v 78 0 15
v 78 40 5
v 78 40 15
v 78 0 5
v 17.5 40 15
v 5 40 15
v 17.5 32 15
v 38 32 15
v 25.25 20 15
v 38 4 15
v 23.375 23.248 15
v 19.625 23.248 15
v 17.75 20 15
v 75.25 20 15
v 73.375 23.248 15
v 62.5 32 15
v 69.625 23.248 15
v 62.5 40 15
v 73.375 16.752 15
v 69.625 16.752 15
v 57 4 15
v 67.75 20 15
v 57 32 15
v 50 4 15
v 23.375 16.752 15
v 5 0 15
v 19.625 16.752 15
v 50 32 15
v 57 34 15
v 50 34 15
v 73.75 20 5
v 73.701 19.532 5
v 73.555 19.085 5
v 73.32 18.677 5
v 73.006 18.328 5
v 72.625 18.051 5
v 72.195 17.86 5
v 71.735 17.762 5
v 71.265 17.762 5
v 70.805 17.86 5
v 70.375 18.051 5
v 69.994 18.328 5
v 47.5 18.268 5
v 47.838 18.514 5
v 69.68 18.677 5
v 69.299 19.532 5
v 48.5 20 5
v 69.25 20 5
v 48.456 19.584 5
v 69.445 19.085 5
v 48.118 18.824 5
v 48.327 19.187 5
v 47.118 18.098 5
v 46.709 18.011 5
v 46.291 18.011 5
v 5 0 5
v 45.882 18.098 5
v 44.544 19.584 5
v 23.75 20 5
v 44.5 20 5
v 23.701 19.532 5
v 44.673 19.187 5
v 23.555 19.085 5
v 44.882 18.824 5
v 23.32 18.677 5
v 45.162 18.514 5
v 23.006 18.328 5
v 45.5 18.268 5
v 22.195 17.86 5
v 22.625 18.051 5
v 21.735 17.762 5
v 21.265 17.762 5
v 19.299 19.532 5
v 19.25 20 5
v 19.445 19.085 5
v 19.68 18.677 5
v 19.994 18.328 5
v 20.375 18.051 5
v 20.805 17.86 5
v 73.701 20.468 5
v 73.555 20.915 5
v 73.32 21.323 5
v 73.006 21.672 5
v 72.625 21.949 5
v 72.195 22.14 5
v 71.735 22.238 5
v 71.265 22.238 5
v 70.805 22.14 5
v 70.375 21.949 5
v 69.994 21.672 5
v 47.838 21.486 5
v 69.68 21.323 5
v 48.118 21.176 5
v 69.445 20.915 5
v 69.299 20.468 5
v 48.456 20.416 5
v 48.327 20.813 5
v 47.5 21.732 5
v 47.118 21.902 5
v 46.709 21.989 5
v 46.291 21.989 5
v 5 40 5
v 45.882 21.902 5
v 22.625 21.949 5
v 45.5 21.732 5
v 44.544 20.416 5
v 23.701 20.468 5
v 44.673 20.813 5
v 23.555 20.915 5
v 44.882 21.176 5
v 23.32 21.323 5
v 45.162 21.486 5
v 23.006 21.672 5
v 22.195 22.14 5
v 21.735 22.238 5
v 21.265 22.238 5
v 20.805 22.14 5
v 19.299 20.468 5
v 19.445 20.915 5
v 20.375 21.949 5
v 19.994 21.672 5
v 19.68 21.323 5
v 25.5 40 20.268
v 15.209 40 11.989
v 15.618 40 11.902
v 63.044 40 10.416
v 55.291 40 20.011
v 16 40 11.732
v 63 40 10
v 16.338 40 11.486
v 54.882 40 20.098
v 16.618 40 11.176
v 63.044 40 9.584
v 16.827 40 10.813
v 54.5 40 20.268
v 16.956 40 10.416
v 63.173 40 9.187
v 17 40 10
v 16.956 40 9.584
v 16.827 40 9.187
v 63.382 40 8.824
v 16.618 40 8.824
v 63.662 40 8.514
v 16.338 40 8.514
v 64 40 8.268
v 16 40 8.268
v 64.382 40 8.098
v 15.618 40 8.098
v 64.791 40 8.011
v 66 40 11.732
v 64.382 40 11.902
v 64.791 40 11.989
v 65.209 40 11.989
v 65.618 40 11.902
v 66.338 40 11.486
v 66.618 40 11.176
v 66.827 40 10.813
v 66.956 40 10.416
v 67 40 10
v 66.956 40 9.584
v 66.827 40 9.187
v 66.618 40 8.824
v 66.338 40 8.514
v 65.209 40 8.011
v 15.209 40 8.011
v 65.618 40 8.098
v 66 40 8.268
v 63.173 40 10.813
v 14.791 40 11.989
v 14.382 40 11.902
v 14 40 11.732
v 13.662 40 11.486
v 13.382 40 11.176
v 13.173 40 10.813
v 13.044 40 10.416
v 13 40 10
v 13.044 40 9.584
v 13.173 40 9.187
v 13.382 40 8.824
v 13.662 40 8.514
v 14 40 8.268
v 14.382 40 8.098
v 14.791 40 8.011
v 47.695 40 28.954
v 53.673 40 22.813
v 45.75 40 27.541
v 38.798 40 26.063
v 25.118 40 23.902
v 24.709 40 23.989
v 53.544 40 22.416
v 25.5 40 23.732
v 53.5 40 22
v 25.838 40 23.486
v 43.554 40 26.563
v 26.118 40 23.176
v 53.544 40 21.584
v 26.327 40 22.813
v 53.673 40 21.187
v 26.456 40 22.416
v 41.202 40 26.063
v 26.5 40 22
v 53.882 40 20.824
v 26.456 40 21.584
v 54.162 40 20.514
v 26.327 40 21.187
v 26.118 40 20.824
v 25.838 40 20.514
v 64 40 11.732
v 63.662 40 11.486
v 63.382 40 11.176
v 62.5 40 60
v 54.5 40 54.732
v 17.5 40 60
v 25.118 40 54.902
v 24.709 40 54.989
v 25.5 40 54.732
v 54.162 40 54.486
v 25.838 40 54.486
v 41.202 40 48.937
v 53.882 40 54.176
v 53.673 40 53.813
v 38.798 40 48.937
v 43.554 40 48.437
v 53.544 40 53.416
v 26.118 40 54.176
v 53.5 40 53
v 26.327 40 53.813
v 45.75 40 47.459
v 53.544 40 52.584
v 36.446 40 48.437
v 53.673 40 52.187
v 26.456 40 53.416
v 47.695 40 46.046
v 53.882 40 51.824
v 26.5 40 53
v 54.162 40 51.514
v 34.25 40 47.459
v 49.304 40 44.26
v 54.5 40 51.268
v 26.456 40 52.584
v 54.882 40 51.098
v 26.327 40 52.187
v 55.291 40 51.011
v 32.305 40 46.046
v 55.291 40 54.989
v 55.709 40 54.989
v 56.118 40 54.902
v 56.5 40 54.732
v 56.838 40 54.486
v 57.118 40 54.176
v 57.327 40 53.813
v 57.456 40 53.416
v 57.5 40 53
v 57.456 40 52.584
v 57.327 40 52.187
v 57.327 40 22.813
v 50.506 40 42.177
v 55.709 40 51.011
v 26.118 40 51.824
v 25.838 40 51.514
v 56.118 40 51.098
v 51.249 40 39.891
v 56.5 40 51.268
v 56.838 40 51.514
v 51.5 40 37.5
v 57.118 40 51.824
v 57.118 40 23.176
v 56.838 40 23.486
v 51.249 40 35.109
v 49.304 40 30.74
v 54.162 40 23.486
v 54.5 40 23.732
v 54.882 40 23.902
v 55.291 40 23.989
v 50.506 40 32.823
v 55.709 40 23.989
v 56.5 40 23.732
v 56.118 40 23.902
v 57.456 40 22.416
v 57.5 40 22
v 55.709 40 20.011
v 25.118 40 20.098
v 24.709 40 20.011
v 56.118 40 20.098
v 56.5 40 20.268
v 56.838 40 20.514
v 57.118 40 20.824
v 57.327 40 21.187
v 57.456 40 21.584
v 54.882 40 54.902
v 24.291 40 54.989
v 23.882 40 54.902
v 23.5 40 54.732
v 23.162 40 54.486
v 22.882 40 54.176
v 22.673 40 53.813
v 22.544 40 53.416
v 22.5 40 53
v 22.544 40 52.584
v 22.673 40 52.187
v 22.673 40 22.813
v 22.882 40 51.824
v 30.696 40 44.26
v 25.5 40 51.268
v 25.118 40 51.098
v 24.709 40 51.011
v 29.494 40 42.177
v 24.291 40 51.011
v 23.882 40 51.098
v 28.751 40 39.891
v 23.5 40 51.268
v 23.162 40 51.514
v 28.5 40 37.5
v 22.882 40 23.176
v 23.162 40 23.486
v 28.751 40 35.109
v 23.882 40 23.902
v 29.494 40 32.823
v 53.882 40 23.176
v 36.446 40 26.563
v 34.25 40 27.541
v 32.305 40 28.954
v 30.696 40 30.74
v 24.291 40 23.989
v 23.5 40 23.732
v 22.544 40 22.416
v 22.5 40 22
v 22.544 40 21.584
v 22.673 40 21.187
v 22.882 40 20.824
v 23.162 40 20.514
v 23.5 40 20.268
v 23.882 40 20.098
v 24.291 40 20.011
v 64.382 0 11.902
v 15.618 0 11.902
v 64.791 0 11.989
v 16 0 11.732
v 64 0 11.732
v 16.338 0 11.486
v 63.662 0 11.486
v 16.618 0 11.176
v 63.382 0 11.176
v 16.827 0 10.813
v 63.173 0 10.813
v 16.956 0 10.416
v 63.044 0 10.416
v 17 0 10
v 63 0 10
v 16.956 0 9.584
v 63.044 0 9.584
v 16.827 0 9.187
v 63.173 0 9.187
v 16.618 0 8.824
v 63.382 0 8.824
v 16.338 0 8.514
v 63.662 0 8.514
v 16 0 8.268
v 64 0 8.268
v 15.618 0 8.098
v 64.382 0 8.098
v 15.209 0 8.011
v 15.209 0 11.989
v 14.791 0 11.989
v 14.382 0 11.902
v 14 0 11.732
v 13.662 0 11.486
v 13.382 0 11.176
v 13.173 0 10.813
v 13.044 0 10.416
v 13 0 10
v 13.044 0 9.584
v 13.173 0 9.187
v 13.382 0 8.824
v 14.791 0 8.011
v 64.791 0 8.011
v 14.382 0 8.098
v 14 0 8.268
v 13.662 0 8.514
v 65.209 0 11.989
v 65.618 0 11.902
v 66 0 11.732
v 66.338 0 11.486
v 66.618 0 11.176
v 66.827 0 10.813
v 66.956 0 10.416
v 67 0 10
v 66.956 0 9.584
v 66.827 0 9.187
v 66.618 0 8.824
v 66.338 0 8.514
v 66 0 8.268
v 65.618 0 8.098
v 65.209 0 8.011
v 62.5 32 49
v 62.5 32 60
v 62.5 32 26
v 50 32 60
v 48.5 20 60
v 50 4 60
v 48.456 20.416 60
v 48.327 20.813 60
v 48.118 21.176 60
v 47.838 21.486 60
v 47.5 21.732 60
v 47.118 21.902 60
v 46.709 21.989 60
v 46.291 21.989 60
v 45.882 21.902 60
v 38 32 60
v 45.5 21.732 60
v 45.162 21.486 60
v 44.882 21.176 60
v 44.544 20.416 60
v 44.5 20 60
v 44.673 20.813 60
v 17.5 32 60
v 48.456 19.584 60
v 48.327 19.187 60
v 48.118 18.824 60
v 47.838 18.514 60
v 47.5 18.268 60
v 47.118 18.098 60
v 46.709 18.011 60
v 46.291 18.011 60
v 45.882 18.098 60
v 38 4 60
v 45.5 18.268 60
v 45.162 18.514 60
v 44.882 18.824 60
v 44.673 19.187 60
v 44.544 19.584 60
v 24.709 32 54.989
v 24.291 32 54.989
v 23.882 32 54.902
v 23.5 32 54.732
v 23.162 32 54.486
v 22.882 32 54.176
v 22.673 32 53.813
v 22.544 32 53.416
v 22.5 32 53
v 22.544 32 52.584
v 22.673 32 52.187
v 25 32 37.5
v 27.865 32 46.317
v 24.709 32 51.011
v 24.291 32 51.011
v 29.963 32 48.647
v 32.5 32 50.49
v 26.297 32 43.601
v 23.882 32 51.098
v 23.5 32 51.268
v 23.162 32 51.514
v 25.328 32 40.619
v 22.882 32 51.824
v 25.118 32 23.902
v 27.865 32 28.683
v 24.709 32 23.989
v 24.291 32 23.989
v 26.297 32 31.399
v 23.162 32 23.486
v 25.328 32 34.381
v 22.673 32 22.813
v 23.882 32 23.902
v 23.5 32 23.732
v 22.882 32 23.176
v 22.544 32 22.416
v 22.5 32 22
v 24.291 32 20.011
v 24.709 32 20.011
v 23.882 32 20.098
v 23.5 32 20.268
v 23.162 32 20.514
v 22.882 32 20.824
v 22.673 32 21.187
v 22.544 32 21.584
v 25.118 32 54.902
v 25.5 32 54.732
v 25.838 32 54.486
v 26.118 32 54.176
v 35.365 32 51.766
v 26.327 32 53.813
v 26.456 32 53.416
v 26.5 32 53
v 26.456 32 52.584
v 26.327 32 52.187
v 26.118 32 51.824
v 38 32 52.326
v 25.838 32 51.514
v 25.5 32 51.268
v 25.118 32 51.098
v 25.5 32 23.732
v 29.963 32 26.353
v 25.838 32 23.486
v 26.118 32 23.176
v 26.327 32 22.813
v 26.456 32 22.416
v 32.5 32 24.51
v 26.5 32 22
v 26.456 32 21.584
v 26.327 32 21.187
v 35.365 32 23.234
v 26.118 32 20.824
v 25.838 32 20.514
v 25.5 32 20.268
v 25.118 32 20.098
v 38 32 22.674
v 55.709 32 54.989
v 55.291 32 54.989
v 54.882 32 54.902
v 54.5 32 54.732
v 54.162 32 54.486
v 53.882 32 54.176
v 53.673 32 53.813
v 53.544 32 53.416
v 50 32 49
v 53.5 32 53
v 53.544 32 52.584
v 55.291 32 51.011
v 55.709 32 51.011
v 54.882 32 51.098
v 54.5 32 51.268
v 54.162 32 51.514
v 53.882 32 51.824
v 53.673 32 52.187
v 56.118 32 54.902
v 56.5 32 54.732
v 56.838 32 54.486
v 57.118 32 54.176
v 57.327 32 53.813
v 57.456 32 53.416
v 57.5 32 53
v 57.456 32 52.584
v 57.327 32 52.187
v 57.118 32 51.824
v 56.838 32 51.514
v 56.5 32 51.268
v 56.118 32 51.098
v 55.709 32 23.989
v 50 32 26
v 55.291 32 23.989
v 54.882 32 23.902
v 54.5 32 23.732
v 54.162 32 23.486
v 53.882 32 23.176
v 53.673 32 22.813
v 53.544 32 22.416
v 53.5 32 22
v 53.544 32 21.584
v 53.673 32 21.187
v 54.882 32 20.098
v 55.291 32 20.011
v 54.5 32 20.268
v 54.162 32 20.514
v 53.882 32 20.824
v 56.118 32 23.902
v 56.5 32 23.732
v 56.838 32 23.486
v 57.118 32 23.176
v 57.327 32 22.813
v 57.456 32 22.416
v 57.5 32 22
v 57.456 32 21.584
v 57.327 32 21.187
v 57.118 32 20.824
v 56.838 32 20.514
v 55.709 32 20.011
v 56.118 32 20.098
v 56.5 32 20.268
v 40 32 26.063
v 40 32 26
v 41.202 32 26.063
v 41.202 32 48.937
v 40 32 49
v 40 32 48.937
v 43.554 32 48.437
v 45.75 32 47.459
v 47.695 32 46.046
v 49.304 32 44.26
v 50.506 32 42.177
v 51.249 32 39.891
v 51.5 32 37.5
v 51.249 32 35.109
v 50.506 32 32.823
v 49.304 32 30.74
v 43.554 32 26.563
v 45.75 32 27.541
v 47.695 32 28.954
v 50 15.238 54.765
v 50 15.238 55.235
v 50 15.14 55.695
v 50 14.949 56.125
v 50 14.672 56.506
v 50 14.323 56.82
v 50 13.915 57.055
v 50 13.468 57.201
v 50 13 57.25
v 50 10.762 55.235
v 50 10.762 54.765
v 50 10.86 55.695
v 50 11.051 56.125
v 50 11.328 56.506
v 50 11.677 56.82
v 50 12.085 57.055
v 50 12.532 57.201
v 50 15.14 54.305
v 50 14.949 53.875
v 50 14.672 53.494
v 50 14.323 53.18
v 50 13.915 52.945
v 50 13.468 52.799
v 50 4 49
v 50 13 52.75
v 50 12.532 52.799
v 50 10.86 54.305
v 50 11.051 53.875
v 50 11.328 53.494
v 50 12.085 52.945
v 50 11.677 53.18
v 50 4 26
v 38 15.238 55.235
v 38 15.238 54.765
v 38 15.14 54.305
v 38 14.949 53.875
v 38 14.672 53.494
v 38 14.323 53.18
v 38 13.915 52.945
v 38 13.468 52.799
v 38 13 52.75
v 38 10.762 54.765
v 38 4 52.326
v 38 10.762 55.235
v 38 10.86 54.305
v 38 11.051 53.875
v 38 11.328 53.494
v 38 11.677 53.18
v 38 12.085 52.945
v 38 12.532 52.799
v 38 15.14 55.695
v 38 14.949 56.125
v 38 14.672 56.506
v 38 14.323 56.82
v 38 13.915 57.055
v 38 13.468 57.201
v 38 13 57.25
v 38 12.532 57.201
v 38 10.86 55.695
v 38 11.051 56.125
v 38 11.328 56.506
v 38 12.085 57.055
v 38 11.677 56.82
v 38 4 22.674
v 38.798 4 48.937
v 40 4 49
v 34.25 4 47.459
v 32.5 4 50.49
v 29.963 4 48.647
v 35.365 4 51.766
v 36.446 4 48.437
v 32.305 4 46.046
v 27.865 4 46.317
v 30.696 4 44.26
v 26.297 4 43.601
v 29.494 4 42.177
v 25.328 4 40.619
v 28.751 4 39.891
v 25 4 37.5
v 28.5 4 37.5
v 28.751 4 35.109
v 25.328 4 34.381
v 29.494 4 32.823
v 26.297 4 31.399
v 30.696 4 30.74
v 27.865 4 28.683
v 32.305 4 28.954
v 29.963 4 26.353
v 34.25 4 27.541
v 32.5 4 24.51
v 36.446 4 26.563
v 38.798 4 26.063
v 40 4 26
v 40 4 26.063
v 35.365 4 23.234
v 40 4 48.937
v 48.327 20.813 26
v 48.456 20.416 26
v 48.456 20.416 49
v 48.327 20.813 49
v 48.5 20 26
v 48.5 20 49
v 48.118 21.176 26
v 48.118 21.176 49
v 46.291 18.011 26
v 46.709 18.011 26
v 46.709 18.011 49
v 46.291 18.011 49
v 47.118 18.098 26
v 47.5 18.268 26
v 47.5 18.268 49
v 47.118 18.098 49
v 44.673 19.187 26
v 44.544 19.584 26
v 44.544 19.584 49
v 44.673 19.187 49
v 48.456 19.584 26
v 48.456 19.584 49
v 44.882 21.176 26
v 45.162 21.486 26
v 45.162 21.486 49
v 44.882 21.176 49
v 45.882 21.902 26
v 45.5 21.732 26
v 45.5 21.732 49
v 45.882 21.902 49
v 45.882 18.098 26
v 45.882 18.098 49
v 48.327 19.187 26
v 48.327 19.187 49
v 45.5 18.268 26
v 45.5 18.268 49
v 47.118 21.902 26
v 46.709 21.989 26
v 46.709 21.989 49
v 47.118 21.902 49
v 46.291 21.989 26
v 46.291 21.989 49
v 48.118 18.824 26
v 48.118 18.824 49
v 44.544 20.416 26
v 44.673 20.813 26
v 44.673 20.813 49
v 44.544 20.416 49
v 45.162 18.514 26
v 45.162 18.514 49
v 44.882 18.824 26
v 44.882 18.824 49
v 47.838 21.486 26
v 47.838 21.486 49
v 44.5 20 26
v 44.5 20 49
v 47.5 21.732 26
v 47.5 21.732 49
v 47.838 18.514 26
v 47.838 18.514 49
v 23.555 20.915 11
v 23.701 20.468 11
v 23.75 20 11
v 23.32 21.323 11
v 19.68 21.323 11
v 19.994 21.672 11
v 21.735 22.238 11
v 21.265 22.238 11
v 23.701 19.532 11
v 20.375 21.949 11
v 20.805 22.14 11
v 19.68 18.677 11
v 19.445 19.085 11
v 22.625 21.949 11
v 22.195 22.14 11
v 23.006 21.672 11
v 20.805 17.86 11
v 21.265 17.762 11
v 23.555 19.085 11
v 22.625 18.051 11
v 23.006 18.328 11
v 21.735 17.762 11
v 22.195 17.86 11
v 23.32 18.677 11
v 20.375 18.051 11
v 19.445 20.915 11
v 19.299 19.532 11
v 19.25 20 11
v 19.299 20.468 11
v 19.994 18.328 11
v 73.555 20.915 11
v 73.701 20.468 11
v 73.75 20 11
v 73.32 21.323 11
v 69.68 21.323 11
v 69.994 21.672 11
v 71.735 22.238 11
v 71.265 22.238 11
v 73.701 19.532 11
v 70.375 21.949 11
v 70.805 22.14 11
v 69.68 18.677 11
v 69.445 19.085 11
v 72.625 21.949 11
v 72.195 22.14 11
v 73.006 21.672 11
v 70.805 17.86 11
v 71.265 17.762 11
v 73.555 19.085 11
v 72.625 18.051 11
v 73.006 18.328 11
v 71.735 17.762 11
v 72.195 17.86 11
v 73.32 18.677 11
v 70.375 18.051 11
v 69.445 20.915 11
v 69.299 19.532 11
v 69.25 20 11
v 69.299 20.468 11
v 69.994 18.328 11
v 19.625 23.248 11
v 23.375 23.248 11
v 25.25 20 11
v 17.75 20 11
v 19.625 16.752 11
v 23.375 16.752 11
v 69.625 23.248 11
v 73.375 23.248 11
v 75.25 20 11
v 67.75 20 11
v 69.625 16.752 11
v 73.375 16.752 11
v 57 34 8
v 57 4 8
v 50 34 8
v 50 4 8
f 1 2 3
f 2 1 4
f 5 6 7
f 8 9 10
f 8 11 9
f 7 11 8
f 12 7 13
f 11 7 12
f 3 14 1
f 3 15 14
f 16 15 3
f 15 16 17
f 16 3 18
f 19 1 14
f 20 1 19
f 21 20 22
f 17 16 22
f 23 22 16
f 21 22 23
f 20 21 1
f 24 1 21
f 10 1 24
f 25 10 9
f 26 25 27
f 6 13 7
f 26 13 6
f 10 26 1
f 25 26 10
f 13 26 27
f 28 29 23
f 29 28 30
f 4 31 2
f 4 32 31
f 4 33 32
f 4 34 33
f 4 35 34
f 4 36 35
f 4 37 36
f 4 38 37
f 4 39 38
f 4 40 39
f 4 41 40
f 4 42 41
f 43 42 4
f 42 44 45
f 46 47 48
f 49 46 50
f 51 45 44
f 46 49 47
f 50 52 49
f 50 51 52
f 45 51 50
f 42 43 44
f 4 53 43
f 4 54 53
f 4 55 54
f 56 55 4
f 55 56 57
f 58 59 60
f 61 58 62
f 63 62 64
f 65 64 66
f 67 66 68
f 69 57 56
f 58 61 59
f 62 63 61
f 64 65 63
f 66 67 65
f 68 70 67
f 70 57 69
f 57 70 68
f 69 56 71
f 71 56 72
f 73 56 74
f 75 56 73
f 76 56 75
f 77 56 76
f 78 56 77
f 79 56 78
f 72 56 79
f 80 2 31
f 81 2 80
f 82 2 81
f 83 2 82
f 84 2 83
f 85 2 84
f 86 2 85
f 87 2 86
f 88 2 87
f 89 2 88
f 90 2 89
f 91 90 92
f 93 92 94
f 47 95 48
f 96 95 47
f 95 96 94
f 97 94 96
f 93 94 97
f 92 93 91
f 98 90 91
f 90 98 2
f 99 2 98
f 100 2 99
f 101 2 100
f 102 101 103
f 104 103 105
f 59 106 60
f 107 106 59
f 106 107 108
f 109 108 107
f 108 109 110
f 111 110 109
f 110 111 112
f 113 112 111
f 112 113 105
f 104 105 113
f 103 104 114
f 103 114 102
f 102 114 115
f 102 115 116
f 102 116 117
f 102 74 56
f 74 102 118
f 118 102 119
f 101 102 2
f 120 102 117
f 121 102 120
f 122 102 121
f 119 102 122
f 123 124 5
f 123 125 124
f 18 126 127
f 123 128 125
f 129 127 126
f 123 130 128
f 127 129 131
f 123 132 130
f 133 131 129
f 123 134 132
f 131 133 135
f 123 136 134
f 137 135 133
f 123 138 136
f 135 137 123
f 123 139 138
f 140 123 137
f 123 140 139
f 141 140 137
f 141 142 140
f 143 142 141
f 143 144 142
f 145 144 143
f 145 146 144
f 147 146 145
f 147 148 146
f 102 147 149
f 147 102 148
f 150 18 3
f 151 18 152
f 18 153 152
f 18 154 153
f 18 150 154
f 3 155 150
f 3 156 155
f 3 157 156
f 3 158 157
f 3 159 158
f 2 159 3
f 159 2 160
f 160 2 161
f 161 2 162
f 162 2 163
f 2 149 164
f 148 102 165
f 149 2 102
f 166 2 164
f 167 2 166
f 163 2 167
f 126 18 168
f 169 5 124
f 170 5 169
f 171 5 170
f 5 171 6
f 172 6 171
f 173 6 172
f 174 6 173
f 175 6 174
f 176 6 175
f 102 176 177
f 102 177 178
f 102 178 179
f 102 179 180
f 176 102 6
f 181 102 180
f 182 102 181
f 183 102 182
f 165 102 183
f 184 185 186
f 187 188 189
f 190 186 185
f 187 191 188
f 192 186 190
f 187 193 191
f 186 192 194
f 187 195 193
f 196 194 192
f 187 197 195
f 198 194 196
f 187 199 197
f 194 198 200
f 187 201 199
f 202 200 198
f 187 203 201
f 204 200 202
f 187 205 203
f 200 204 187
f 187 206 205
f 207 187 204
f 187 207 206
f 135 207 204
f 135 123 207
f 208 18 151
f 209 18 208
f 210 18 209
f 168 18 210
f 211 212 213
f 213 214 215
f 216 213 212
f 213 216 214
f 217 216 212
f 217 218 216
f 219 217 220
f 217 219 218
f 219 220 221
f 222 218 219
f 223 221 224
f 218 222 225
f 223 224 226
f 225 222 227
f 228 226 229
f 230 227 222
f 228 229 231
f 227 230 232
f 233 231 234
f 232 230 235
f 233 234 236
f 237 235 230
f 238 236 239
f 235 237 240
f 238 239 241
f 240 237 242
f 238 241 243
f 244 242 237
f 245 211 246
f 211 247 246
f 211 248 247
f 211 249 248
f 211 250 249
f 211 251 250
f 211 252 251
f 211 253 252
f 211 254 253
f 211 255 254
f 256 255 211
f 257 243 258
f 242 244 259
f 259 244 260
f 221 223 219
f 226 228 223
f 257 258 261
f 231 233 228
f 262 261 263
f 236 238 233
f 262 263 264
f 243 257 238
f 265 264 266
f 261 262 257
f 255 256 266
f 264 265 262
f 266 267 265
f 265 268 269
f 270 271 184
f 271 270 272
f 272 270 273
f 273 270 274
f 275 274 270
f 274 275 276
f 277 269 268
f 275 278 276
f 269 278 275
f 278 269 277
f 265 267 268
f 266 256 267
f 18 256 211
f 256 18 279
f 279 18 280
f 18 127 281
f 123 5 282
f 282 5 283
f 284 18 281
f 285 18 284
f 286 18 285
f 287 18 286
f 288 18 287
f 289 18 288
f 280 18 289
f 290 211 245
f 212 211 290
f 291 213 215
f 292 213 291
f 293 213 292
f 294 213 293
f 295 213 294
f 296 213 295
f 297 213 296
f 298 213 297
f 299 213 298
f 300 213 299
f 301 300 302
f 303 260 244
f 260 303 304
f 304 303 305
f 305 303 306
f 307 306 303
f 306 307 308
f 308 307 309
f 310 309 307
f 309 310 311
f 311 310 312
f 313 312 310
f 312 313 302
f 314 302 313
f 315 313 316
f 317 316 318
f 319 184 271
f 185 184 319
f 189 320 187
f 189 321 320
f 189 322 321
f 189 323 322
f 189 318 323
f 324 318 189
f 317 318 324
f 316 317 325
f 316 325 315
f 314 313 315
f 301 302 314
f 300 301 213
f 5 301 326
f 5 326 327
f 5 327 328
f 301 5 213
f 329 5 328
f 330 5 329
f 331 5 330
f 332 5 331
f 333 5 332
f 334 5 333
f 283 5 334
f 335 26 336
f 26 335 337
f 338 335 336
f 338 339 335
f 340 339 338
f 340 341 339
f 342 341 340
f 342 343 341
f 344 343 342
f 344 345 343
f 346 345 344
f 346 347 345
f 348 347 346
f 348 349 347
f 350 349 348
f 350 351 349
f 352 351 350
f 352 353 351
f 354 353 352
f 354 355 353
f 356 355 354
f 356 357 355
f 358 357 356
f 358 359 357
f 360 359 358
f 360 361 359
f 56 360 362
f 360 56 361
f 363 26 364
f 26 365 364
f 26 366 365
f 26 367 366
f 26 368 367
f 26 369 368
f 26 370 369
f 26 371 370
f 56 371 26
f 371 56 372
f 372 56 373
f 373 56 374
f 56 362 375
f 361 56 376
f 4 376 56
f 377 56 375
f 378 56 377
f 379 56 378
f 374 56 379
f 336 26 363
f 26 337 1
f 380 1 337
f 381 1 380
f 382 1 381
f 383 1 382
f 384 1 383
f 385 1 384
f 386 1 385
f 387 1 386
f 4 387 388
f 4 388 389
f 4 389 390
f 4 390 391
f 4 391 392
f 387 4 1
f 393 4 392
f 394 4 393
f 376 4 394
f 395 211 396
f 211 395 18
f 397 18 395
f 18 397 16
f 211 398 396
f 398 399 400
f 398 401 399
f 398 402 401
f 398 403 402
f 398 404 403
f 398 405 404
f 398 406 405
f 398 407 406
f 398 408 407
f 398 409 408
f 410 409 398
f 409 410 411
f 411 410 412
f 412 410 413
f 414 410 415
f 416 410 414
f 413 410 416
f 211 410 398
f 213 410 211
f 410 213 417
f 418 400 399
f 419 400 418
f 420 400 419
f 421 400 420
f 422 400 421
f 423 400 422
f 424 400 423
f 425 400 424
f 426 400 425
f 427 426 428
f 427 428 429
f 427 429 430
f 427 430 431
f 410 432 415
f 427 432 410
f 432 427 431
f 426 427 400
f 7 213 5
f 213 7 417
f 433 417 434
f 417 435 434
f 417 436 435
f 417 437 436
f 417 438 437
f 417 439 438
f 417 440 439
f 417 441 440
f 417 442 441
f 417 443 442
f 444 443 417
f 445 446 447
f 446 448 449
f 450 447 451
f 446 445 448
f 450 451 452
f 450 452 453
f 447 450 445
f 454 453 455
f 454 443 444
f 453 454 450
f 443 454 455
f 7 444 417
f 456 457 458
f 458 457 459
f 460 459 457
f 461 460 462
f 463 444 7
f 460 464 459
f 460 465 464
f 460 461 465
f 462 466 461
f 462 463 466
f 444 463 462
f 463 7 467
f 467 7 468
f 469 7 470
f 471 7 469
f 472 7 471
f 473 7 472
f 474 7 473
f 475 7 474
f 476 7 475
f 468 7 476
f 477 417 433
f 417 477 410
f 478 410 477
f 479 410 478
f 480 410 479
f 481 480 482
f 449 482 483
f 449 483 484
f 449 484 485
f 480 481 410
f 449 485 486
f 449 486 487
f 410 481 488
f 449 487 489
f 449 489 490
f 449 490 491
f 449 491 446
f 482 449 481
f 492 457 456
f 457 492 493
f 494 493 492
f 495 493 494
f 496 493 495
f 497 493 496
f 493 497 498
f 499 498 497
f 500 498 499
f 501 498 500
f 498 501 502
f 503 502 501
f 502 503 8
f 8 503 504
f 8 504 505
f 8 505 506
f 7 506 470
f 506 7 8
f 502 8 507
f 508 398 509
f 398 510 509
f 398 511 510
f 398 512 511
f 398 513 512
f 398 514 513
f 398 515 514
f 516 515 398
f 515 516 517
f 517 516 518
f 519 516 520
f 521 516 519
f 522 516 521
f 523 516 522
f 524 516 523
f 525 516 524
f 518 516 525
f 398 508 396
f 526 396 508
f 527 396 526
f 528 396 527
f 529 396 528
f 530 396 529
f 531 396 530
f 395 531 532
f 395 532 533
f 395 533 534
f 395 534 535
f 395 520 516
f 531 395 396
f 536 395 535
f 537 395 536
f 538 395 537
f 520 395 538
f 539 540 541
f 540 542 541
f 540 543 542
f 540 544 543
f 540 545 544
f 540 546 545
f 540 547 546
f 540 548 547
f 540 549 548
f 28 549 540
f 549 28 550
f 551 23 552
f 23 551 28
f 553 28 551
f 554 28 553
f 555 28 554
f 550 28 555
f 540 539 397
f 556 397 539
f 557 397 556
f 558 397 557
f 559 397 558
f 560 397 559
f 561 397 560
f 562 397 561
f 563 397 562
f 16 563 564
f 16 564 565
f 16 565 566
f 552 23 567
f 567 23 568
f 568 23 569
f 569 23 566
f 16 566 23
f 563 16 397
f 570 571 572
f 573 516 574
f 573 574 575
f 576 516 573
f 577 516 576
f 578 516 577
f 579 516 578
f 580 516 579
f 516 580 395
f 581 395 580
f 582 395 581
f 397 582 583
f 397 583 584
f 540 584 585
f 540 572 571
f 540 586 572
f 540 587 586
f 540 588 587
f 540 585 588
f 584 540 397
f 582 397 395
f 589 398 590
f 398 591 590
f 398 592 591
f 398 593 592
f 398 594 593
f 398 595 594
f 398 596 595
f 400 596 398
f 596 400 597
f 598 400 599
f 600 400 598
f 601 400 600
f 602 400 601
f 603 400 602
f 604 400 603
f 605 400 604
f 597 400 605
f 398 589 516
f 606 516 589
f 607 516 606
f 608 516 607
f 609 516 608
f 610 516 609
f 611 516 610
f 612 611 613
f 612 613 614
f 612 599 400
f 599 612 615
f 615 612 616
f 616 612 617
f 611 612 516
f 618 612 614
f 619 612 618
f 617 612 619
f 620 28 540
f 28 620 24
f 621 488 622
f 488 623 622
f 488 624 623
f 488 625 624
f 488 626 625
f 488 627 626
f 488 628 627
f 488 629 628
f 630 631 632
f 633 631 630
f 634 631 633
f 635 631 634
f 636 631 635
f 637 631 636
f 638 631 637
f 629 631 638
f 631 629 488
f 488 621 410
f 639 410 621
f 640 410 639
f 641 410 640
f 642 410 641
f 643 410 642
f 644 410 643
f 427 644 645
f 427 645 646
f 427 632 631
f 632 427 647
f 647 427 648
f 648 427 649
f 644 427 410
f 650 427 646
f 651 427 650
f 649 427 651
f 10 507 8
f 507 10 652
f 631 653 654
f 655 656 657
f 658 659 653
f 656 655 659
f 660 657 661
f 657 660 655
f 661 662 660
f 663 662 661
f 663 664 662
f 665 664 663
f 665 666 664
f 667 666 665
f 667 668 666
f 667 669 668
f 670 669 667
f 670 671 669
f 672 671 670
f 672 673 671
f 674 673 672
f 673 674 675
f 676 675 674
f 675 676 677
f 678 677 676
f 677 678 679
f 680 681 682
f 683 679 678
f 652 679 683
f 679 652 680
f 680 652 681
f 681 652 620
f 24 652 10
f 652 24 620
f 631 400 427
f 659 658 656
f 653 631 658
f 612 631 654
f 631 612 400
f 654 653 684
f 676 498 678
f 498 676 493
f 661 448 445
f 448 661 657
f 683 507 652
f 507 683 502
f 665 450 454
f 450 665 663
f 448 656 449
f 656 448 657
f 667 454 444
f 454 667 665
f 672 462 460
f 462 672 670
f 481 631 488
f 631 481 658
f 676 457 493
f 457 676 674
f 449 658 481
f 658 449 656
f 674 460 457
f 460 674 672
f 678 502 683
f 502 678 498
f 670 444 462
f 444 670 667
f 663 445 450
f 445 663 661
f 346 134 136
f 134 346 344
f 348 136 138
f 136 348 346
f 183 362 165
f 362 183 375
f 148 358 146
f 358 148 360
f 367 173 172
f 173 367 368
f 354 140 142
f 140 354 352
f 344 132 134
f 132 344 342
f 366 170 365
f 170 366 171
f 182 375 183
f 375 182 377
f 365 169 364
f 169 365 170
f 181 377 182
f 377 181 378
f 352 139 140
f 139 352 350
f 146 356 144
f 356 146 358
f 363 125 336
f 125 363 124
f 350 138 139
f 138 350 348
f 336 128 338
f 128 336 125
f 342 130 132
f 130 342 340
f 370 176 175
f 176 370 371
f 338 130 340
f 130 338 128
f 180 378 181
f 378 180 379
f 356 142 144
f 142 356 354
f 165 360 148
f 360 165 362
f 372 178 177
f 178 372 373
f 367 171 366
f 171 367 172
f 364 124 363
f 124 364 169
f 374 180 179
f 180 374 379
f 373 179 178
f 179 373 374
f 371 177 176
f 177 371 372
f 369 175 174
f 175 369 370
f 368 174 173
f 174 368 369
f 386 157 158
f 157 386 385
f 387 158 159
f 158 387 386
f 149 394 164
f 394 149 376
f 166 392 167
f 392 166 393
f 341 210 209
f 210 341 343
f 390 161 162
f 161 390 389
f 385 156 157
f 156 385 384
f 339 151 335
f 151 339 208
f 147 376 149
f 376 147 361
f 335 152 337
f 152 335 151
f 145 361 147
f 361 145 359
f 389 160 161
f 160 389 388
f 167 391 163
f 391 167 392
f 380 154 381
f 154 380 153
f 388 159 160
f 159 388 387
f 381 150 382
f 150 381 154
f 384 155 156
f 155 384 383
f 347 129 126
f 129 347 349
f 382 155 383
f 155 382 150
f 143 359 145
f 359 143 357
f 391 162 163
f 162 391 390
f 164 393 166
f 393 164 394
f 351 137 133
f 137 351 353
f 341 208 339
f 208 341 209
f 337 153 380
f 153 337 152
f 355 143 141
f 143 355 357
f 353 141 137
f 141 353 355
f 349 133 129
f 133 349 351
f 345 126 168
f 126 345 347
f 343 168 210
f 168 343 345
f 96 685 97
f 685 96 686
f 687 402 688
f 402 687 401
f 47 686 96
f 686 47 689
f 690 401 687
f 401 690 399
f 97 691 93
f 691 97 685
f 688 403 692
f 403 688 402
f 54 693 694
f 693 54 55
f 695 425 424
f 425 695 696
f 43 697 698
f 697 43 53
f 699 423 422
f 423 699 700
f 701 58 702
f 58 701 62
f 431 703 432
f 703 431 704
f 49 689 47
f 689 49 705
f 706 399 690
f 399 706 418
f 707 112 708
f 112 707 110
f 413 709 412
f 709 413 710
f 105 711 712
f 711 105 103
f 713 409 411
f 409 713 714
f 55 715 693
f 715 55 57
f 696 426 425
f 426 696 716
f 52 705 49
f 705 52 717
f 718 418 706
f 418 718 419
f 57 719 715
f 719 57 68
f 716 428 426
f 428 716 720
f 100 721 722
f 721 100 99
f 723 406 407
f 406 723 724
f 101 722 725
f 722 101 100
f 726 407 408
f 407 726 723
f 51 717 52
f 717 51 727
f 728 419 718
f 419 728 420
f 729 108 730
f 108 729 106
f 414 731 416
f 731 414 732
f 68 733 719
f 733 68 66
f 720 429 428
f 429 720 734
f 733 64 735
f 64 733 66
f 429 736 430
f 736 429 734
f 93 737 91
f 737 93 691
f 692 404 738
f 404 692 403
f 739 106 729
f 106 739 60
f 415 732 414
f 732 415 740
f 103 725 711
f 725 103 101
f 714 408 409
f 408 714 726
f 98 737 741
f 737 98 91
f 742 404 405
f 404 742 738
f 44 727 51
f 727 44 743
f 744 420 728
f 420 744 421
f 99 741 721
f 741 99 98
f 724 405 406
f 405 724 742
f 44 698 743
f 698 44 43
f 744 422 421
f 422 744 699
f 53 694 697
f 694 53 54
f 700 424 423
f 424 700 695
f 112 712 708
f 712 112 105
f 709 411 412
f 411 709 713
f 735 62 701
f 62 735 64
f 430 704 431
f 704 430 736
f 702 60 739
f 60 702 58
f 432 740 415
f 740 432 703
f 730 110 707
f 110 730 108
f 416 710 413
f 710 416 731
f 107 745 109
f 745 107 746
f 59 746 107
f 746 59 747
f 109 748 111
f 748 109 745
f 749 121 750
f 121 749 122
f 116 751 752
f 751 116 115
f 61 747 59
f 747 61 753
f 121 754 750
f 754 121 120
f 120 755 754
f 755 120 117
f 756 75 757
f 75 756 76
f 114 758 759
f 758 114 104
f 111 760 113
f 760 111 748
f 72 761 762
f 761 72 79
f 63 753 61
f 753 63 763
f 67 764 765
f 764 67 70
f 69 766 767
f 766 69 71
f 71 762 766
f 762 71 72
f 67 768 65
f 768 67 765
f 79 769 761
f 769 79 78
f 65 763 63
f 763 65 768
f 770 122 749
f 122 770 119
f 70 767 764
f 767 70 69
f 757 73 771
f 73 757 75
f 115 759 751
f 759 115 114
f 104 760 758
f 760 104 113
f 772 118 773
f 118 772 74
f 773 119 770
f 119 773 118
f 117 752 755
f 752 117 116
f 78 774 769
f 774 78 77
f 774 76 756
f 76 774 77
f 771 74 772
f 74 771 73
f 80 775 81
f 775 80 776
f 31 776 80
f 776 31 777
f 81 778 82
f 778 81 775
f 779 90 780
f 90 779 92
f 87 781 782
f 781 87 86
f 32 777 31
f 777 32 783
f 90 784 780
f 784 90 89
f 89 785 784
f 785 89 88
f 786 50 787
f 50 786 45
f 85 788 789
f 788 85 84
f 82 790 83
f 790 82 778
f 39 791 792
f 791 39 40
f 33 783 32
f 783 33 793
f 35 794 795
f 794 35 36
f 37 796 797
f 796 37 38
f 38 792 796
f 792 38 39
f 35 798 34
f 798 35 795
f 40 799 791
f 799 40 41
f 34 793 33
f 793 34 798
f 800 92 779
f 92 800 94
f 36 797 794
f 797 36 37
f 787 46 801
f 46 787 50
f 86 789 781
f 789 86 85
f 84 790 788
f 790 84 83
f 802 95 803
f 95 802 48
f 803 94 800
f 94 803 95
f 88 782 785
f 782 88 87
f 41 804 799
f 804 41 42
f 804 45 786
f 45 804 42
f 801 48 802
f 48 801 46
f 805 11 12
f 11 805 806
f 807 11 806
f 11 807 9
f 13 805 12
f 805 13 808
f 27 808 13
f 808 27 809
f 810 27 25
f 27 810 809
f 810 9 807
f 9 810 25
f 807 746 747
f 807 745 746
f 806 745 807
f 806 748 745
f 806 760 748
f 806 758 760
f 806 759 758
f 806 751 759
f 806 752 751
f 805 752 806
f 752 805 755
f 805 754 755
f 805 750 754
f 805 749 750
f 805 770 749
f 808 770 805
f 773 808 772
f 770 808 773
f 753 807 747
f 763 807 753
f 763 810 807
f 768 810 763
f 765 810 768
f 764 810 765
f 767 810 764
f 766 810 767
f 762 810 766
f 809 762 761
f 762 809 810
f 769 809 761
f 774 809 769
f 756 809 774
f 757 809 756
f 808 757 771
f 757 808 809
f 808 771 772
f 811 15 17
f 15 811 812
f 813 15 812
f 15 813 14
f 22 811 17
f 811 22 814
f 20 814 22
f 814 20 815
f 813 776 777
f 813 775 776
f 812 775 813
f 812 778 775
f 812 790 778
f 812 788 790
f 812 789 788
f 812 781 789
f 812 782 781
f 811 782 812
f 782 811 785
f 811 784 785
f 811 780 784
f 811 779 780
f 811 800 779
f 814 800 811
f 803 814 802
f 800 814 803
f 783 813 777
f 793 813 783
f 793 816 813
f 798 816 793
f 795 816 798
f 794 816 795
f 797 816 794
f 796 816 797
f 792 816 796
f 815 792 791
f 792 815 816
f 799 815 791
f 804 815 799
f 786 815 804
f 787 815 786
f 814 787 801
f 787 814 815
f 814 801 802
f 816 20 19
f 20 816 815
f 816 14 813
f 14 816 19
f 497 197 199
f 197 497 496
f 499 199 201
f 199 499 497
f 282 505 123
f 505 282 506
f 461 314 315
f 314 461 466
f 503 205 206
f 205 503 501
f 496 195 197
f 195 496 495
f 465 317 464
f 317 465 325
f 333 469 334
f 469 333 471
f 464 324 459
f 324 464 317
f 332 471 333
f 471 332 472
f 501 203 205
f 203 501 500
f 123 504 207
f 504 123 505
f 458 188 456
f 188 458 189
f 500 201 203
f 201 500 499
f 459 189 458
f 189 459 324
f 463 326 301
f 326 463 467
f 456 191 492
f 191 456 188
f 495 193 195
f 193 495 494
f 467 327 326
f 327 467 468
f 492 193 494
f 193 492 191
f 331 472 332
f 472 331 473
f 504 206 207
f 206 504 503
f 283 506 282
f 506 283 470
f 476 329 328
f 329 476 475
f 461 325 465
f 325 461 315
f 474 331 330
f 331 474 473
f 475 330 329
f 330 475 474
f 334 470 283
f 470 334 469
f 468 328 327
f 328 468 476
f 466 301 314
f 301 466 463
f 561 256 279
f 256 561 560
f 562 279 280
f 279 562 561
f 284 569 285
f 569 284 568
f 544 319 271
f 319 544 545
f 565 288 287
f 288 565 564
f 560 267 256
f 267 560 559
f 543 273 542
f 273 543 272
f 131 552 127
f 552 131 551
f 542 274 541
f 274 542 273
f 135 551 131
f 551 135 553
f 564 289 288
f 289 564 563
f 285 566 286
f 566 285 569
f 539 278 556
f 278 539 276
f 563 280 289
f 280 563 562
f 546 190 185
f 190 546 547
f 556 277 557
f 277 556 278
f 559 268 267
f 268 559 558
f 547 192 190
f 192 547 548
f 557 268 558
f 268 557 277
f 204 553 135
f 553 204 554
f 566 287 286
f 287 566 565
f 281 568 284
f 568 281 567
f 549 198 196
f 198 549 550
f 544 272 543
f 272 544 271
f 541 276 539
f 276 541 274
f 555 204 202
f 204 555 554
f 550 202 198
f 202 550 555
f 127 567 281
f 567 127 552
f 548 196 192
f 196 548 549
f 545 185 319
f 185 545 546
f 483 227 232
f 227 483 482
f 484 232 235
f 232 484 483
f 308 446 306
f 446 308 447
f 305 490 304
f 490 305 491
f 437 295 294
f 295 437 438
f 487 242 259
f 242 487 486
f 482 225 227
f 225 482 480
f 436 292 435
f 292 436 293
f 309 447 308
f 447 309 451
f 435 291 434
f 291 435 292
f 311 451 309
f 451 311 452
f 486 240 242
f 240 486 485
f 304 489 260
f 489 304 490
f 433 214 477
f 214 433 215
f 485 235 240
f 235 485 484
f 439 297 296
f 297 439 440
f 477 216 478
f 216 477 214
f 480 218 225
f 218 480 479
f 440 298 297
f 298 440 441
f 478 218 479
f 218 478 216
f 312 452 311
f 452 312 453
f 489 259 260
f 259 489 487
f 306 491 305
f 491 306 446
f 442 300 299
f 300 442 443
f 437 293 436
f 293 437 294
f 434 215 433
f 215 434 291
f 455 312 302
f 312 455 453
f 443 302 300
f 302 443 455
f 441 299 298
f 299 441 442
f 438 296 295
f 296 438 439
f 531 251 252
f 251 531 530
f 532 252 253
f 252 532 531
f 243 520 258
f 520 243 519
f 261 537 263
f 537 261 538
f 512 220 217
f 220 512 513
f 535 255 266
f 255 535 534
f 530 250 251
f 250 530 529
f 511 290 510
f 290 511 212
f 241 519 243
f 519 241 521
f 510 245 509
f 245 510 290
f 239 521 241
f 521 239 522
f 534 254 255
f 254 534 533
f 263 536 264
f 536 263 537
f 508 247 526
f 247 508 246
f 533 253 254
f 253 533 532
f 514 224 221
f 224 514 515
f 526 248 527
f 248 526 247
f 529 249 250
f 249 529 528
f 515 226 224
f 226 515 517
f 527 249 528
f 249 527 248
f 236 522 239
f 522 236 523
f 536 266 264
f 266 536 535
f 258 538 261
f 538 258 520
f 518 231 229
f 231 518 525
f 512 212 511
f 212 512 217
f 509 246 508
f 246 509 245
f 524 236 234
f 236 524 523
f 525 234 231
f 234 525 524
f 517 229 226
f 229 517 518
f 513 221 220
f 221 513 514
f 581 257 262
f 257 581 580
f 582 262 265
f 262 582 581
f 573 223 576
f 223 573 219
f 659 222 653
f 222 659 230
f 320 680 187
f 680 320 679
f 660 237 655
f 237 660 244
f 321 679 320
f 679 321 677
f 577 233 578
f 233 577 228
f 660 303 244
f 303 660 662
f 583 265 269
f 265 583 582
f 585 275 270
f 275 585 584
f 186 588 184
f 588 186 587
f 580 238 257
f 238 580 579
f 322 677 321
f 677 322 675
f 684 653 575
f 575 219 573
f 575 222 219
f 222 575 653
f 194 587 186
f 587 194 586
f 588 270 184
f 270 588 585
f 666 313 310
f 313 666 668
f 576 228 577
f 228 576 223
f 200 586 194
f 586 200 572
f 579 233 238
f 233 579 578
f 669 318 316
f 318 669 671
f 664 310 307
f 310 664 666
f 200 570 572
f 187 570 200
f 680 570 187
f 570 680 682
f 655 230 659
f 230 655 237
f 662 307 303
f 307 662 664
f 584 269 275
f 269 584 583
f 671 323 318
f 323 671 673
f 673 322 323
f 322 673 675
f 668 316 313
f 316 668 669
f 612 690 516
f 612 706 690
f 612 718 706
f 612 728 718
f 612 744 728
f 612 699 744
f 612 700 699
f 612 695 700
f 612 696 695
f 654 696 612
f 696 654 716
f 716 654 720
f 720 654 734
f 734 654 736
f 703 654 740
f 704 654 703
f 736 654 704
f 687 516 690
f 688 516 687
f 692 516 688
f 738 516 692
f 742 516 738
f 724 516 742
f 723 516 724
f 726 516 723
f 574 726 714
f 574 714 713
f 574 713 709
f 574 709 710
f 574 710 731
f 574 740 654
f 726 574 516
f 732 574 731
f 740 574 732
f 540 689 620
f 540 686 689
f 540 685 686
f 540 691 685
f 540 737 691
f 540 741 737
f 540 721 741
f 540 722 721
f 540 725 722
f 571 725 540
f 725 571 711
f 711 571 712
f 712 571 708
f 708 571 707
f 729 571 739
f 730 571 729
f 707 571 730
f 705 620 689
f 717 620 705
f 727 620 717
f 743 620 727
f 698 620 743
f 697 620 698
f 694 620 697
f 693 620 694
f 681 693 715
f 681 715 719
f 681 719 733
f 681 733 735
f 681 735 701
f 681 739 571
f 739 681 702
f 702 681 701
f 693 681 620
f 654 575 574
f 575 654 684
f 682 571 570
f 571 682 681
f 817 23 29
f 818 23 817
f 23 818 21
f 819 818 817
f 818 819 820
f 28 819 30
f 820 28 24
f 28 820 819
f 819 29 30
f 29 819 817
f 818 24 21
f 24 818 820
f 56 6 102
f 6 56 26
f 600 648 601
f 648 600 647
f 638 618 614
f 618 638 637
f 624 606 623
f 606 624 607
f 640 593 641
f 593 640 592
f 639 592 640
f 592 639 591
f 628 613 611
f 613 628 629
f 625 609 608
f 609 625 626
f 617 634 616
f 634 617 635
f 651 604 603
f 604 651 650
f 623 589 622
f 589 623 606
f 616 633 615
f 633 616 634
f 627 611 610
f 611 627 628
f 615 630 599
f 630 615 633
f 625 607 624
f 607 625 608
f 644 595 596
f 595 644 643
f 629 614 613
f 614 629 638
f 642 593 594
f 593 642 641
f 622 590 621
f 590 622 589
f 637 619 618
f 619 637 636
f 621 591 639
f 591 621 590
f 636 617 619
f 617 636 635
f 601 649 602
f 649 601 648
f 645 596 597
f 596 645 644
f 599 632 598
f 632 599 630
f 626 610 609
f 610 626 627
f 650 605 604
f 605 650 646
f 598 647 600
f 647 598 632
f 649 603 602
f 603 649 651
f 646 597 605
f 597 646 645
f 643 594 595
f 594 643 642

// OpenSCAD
//$fn=360;
$fn=30;
module base(){
  difference(){
    // Bloques
    union(){
      // Base
      translate([0,0,5])cube([78,40,10]);
      // Anclaje motor
      translate([17.5,32,15]) cube([45,8,45]);
      // Guia
      translate([38,4,15]) cube([12,28,45]);
      translate([40,18,37.5]) rotate([90,0,0]) cylinder(d=30, h=28, center=true);
    }

    // Agujeros
    union(){
      // Tornillos anclaje a carro
      translate([15,0,7.5+5/2]) rotate([90,0,0]) cylinder(d=4, h=100, center=true);
      translate([65,0,7.5+5/2]) rotate([90,0,0]) cylinder(d=4, h=100, center=true);
      // Filamento
      translate([46.5,20,40]) cylinder(d=4, h=100, center=true);
      // Tornillos fary
      translate([21.5,20,7.5]) cylinder(d=4.5, h=50, center=true);
      translate([71.5,20,7.5]) cylinder(d=4.5, h=50, center=true);
      // Zocalos tuercas fary
      translate([21.5,20,16]) cylinder(d=7.5, h=10, center=true,$fn=6);
      translate([71.5,20,16]) cylinder(d=7.5, h=10, center=true,$fn=6);
      // Tornillos motor
      translate([24.5,40,22]) rotate([90,0,0]) cylinder(d=4, h=100, center=true);
      translate([55.5,40,22]) rotate([90,0,0]) cylinder(d=4, h=100, center=true);
      translate([24.5,40,53]) rotate([90,0,0]) cylinder(d=4, h=100, center=true);
      translate([55.5,40,53]) rotate([90,0,0]) cylinder(d=4, h=100, center=true);
      // Eje motor
      translate([40,40,37.5]) rotate([90,0,0]) cylinder(d=23, h=100, center=true);
      // Entrada para el idler
      translate([40,0,26]) cube([50,32,23]);
      // Ranura para el idler
      translate([50,4,8]) cube([7,30,7]);
      // Exceso de anchura
      cube([5,45,20]);
      // Tornillo apriete
      translate([50,13,55]) rotate([0,90,0]) cylinder(d=4.5, h=1000, center=true);
    }
  }
}

module idler(){
  // Idler
  difference(){
    union(){
      // Pie ranura
      translate([51,5,8]) cube([5,26,52]);
      // Soporte rodamiento
      translate([56,5,17]) cube([10,26,43]);
     
    }
    union(){
      // Zocalo rodamiento
      translate([50,15.5,25]) cube([40,9,25]);
      // Eje rodamiento/
      translate([56,40,37.5]) rotate([90,0,0]) cylinder(d=7.6, h=100, center=true);
      translate([48.4,2,33.7]) cube([7.6,30,7.6]);
      // Tornillo apriete
      translate([50,13,55]) rotate([0,90,0]) cylinder(d=5, h=1000, center=true);
    }
  }
}

base();
//idler();
